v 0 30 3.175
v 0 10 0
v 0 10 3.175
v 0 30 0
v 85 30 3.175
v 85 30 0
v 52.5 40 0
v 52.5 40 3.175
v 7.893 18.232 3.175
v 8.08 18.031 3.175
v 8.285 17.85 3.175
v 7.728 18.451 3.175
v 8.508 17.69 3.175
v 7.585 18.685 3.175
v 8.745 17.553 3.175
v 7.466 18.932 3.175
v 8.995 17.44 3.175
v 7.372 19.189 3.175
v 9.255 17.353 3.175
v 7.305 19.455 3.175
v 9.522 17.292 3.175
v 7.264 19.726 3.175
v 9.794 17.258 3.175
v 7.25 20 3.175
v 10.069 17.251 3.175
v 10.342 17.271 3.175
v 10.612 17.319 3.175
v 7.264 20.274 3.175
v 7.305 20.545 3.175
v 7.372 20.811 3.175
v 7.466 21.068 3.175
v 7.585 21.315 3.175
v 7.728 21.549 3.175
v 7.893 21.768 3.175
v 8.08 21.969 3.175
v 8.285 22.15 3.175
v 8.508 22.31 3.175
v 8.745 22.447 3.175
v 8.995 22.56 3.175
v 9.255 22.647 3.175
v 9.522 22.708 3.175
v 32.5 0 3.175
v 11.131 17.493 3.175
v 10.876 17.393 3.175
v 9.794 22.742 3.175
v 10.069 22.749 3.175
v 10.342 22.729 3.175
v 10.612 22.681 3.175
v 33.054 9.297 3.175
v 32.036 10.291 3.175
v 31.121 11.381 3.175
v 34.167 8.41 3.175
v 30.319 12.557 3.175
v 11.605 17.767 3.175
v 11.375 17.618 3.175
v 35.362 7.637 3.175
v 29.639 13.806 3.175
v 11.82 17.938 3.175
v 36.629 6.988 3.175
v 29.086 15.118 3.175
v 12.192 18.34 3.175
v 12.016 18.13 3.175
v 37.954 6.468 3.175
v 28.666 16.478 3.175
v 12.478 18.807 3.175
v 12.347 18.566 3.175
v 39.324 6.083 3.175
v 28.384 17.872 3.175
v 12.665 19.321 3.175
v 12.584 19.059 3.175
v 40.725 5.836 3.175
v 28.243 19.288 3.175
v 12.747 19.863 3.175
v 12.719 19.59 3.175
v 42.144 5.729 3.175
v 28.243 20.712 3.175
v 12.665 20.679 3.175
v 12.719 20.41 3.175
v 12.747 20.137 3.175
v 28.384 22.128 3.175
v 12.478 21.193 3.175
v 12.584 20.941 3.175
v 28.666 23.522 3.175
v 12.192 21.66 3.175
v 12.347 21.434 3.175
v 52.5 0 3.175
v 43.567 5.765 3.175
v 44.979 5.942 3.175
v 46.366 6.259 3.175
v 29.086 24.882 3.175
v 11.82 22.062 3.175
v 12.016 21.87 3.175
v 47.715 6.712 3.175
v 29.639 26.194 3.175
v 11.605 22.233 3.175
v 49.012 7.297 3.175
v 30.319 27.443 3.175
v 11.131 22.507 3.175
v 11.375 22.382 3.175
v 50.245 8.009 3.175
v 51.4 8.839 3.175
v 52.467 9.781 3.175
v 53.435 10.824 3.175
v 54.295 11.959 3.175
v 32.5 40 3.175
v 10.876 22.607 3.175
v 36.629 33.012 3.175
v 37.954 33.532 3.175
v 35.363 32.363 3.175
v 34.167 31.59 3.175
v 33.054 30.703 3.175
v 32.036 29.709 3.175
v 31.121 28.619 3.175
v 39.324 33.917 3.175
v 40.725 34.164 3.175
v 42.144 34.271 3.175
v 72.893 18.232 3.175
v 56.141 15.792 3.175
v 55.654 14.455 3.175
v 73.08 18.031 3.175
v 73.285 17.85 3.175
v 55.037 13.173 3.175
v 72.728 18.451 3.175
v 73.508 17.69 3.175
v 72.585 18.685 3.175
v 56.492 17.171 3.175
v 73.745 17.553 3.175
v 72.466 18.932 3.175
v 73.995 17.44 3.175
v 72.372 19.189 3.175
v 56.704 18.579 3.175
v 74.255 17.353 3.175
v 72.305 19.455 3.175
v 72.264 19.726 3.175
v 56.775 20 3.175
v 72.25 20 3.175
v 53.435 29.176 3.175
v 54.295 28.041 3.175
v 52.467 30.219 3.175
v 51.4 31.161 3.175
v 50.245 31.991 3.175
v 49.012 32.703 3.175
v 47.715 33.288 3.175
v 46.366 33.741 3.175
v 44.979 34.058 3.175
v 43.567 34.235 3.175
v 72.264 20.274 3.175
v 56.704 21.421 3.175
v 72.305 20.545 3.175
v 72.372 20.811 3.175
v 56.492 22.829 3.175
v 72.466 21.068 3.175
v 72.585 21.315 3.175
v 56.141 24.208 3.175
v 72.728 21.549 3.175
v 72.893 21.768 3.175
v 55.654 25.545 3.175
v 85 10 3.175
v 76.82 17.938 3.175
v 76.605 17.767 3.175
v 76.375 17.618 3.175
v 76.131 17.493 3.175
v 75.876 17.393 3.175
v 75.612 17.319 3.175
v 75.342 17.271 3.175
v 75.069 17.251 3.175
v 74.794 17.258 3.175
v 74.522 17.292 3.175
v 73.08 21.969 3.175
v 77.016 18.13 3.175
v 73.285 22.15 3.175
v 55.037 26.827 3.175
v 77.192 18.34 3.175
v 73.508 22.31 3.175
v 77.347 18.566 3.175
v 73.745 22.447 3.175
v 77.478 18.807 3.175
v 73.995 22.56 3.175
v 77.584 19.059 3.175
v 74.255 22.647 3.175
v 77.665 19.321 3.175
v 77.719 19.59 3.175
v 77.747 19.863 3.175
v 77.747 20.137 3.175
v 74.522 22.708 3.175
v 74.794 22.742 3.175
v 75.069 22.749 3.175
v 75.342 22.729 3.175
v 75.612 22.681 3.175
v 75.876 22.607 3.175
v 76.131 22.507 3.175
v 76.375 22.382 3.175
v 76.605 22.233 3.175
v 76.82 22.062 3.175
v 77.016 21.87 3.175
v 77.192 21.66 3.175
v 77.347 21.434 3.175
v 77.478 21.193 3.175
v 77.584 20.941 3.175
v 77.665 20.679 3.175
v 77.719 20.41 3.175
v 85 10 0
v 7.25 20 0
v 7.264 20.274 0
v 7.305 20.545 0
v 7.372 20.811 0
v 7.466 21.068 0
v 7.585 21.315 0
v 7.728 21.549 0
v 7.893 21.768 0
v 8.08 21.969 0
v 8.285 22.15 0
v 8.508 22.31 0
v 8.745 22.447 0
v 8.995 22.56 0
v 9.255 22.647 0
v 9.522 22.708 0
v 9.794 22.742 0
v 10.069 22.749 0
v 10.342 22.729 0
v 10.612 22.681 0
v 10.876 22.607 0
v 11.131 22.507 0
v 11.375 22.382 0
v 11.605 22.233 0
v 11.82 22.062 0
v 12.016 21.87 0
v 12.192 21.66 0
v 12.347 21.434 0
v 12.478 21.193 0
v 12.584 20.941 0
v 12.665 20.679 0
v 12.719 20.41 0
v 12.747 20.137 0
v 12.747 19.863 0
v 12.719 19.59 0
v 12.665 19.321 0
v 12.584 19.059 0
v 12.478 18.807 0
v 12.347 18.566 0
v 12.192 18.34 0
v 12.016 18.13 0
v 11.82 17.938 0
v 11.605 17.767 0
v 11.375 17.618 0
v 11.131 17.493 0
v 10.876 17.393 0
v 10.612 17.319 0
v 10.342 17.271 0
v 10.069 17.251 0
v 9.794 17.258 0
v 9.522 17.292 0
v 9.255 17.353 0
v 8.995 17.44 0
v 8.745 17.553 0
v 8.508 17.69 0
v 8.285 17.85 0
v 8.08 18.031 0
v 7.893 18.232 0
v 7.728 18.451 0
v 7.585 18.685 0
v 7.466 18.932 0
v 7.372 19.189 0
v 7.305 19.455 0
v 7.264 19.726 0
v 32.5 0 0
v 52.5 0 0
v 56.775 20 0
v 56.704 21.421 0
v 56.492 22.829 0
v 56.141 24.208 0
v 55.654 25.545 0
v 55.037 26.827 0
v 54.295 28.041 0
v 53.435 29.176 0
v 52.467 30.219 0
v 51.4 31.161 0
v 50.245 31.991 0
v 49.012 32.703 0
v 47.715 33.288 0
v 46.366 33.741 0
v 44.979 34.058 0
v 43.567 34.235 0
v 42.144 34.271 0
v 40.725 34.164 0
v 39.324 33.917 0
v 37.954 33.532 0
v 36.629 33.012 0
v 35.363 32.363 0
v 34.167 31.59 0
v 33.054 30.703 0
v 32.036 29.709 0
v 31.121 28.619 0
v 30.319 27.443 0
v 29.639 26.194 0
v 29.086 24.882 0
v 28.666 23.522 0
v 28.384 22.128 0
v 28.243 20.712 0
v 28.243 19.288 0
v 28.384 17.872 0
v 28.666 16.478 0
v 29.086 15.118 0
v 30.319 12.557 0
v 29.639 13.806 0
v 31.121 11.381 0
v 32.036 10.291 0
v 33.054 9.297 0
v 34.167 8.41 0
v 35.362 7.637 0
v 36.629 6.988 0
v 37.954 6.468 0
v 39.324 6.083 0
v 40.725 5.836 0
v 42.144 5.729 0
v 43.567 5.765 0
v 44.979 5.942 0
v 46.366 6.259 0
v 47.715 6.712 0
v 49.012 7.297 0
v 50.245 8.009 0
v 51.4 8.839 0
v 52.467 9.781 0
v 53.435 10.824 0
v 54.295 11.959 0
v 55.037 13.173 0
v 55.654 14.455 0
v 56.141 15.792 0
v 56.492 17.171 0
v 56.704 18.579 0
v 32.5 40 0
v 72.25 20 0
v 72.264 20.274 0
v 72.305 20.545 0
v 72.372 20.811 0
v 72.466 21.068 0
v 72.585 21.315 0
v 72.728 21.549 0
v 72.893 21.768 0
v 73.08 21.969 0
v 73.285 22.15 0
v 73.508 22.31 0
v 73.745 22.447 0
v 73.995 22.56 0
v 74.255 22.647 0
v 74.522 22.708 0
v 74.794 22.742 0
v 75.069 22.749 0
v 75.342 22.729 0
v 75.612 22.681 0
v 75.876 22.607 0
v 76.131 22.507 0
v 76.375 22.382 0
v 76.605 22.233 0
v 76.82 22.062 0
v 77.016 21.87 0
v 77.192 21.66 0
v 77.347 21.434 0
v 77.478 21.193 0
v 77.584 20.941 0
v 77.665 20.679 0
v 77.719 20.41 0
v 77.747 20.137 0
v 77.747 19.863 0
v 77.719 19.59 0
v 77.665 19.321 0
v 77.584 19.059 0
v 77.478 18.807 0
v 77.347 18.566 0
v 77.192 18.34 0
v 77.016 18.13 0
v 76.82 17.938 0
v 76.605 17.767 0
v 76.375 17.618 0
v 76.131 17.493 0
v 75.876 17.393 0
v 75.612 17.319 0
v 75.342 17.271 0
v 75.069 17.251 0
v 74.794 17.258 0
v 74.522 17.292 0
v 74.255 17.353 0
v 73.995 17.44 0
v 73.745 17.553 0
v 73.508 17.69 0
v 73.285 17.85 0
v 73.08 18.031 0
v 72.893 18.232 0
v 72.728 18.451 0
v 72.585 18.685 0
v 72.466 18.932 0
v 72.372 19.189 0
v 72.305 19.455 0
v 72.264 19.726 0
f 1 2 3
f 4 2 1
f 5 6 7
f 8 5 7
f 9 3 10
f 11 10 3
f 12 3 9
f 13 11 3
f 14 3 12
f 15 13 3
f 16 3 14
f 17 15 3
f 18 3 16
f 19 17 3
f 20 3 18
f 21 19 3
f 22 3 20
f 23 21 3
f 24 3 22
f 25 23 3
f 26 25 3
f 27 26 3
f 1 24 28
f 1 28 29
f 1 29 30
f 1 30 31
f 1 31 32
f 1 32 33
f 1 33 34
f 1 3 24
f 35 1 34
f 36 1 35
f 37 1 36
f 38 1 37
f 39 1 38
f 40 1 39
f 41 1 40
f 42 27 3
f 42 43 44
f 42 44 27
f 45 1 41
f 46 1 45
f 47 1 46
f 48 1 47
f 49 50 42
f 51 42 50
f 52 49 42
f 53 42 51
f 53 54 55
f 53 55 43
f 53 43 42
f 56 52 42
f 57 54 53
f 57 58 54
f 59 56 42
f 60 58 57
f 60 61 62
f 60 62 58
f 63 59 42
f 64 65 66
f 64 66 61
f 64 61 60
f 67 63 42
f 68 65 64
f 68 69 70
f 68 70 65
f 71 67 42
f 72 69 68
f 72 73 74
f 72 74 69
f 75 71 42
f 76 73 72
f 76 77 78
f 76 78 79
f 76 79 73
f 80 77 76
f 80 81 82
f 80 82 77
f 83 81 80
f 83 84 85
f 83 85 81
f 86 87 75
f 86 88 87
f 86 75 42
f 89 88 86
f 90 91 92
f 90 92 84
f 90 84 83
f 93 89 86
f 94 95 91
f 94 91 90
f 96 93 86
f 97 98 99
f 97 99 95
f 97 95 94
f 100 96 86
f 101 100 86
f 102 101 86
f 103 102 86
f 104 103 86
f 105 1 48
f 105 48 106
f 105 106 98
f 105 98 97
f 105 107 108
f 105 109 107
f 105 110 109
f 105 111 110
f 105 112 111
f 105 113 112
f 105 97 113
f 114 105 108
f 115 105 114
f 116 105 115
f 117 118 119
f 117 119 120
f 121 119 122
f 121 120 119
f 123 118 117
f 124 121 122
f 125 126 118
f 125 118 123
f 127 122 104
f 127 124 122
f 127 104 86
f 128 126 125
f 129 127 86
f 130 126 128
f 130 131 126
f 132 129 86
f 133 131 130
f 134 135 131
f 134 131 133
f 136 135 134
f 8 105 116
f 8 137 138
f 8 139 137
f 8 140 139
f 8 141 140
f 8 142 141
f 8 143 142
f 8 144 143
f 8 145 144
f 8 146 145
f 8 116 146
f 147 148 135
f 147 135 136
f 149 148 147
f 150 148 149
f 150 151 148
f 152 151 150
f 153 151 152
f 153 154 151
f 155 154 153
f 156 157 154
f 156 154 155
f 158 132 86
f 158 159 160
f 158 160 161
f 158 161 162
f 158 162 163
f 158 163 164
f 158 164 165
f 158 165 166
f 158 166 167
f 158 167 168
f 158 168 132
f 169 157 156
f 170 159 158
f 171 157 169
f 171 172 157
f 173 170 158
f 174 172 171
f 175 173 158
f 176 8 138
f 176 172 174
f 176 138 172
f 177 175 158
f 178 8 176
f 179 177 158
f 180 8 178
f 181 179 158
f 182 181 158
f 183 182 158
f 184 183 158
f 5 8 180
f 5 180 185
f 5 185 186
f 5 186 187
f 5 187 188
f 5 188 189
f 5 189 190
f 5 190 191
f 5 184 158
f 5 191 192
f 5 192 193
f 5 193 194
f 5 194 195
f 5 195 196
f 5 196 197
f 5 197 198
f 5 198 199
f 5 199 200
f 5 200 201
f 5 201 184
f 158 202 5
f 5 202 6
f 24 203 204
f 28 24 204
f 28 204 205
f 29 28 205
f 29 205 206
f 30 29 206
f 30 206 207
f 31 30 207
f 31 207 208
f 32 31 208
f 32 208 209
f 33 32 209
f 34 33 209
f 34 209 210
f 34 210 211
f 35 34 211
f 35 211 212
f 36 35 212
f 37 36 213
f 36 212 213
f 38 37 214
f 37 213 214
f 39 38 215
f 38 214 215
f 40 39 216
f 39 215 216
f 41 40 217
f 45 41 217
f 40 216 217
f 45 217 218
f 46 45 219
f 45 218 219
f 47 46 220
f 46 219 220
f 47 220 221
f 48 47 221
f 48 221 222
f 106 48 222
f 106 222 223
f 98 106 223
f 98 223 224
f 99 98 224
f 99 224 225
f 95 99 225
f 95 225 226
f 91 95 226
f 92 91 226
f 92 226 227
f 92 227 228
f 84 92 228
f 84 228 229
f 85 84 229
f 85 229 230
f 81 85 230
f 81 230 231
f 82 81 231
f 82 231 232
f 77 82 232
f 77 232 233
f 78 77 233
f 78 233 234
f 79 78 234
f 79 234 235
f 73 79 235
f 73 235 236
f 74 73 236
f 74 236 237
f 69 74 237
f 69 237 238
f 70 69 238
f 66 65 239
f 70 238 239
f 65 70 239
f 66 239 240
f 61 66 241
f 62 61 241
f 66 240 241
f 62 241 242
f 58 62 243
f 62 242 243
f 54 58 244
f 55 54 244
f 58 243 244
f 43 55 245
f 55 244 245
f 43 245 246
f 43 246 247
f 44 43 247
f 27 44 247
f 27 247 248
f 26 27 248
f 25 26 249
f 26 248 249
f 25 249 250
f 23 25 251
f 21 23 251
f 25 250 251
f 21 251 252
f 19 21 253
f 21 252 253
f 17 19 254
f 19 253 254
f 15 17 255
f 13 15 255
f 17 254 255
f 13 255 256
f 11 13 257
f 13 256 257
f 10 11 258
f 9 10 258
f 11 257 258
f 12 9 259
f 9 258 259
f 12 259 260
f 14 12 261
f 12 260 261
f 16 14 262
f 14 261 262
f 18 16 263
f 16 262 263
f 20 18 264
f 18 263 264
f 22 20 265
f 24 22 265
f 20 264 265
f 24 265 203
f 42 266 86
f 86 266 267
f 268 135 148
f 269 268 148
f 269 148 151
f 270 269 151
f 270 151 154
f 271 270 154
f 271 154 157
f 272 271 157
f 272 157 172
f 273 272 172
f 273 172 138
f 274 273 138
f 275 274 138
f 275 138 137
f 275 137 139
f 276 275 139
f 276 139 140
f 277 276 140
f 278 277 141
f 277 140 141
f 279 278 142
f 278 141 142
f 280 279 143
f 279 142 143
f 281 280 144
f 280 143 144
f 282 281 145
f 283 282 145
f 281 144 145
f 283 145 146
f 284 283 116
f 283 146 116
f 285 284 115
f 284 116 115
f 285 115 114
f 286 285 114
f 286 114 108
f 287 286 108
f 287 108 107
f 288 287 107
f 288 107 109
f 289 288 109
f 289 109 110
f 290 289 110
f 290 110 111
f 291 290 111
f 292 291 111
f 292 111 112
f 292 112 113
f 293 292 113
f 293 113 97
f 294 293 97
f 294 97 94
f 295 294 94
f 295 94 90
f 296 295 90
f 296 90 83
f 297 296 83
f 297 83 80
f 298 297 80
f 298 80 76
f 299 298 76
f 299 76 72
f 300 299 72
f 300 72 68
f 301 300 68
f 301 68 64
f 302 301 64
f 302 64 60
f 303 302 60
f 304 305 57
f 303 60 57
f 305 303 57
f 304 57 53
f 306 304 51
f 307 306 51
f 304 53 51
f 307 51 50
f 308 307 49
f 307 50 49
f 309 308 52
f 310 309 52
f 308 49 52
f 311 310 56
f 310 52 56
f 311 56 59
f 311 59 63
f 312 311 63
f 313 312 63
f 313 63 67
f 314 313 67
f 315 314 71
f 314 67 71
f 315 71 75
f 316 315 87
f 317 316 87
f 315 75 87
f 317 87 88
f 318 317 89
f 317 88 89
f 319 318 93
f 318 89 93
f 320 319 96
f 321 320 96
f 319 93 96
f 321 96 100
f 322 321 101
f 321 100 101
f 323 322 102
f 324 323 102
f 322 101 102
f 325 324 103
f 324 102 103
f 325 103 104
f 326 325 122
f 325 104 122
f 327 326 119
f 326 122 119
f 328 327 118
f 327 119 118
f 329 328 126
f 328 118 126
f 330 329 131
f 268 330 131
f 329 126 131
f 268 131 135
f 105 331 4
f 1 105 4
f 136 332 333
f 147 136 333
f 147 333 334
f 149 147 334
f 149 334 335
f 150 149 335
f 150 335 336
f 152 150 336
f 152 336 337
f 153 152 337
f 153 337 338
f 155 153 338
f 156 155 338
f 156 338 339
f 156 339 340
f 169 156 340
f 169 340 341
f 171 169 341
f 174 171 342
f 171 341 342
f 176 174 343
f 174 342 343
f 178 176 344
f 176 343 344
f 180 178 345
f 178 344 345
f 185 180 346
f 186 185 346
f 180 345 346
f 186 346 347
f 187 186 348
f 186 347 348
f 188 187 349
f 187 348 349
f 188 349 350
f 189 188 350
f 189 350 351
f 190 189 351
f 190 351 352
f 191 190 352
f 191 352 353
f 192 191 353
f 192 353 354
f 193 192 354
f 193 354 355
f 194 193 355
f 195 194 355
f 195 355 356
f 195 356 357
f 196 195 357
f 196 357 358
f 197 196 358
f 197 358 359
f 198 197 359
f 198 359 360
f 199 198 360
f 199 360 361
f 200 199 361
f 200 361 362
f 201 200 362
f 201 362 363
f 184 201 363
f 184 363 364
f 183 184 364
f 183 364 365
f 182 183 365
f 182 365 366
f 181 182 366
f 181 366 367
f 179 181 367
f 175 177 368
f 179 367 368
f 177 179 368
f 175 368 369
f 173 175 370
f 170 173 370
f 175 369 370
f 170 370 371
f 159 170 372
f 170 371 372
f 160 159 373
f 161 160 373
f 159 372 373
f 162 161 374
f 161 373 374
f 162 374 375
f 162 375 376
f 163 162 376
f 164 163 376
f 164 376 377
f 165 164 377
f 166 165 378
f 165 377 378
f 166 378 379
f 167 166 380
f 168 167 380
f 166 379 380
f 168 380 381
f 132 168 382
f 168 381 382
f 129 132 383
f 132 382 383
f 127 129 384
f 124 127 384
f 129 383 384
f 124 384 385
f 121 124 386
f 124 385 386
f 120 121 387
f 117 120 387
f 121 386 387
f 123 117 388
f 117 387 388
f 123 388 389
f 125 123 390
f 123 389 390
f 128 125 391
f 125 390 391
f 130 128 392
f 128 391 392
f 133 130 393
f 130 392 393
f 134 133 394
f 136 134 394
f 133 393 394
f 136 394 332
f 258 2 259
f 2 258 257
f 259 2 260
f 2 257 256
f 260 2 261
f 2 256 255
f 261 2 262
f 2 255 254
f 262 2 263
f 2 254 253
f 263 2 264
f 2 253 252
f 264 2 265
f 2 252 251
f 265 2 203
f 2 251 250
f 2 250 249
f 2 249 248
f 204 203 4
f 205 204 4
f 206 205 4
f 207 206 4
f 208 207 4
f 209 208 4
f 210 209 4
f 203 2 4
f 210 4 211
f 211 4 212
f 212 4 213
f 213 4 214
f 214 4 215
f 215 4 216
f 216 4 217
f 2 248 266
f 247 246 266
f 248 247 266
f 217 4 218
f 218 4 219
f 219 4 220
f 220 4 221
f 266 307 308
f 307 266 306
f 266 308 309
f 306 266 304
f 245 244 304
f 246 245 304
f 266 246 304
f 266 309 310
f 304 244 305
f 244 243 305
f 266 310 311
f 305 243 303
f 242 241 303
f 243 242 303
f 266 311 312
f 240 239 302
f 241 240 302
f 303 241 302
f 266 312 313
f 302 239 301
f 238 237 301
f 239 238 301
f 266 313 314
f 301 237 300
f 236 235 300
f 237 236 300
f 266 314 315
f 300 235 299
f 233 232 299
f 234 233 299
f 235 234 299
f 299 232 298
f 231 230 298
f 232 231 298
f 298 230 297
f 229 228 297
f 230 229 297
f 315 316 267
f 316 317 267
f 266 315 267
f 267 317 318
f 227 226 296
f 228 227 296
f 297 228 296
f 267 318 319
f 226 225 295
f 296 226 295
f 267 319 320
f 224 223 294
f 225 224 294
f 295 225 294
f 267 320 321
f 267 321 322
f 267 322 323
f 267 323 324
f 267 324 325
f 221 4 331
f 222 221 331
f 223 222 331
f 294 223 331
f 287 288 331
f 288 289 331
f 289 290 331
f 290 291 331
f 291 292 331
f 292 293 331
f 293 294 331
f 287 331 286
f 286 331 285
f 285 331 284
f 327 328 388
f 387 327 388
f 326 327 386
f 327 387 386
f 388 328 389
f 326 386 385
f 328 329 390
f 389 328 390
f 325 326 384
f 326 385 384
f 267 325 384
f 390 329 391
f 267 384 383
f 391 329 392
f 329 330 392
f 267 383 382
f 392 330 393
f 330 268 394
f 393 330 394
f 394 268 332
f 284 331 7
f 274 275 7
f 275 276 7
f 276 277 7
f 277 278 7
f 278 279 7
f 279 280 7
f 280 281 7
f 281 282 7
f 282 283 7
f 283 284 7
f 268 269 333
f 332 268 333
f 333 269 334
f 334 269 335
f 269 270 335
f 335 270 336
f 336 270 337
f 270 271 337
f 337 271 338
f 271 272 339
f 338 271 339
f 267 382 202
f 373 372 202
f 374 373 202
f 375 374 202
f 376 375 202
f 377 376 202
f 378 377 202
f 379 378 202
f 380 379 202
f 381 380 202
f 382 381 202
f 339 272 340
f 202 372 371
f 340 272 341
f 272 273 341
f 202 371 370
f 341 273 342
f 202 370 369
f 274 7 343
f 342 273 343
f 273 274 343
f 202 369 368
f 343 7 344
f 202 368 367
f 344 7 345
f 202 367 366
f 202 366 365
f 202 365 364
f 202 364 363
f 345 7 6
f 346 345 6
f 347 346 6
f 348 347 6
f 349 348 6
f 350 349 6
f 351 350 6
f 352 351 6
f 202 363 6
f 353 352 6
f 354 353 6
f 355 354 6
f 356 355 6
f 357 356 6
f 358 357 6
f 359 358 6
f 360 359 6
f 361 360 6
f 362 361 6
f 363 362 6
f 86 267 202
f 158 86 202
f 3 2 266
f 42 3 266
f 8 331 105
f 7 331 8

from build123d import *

# Parameters (mm, degrees)
SKETCH1_W           = 85
SKETCH1_H           = 40
BOSS_EXTRUDE1_DEPTH = 3.175
SKETCH2_R           = 14.275
CUT_EXTRUDE1_DEPTH  = 4.175
SKETCH4_OUTSIDE_W   = 105.8
SKETCH4_OUTSIDE_H   = 60.8
CUT_EXTRUDE4_DEPTH  = 4.175
SKETCH6_R           = 2.75
CUT_EXTRUDE6_DEPTH  = 4.175


with BuildPart() as part:
    # Sketch1 → Boss-Extrude1 (new body)
    with BuildSketch(Plane.XY):
        with Locations((42.5, 20)):
            Rectangle(SKETCH1_W, SKETCH1_H)
    extrude(amount=BOSS_EXTRUDE1_DEPTH)

    # Sketch2 → Cut-Extrude1 (cut, through all)
    with BuildSketch(Plane.XY.offset(3.175)):
        with Locations((42.5, 20)):
            Circle(SKETCH2_R)
    extrude(amount=-CUT_EXTRUDE1_DEPTH, mode=Mode.SUBTRACT)

    # Sketch4 outside → Cut-Extrude4 (cut, through all)
    with BuildSketch(Plane(origin=(0, 0, 0), x_dir=(-1, 0, 0), z_dir=(0, 0, -1))):
        with Locations((-42.5, 20)):
            Rectangle(SKETCH4_OUTSIDE_W, SKETCH4_OUTSIDE_H)
        Polygon((-32.5, 40), (0, 30), (0, 10), (-32.5, 0), (-52.5, 0), (-85, 10), (-85, 30), (-52.5, 40), align=None, mode=Mode.SUBTRACT)
    extrude(amount=-CUT_EXTRUDE4_DEPTH, mode=Mode.SUBTRACT)

    # Sketch6 → Cut-Extrude6 (cut, through all)
    with BuildSketch(Plane(origin=(0, 0, 0), x_dir=(-1, 0, 0), z_dir=(0, 0, -1))):
        with Locations((-75, 20)):
            Circle(SKETCH6_R)
        with Locations((-10, 20)):
            Circle(SKETCH6_R)
    extrude(amount=-CUT_EXTRUDE6_DEPTH, mode=Mode.SUBTRACT)


solid = part.part
